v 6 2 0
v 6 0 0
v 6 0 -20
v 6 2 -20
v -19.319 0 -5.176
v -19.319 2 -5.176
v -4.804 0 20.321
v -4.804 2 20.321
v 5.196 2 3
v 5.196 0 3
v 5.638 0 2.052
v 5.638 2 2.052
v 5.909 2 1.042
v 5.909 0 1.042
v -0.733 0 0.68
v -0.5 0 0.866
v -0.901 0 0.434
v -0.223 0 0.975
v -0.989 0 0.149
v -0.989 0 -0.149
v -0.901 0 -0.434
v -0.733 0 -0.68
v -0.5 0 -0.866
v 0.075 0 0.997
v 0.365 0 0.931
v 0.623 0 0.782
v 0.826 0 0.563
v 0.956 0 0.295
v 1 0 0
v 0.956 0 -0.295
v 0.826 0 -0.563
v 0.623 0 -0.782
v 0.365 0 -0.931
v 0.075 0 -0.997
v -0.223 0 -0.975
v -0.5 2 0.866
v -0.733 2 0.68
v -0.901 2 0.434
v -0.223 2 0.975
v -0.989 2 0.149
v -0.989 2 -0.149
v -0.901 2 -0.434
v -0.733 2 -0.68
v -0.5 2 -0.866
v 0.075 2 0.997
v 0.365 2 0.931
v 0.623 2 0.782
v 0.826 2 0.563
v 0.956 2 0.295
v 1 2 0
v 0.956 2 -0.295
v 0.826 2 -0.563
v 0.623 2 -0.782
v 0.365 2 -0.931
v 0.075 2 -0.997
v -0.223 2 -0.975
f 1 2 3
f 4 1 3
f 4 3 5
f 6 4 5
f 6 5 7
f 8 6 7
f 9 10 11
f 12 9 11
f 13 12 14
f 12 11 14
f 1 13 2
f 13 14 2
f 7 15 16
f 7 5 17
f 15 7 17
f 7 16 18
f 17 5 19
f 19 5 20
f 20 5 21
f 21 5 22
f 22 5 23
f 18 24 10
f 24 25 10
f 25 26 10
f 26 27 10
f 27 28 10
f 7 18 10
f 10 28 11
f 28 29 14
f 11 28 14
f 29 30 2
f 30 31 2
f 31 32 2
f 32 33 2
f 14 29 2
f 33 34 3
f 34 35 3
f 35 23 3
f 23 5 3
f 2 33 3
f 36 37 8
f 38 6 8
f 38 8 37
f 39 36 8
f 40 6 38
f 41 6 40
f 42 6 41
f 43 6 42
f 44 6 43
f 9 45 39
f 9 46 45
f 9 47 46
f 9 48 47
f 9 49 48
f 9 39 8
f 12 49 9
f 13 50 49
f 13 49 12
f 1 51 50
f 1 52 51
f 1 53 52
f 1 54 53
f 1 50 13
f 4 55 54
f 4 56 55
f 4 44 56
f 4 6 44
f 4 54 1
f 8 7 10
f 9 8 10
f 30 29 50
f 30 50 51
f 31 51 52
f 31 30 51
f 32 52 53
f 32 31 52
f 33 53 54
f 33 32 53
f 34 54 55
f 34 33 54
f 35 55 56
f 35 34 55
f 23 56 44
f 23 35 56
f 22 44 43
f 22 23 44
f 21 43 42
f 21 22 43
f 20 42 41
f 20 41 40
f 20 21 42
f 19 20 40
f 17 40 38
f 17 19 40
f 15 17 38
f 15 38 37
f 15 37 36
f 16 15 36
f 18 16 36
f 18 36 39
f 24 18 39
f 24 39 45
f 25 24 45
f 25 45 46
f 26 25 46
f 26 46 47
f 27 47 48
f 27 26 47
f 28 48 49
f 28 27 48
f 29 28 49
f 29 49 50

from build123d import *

# Parameters (mm, degrees)
ESQUISSE1_R        = 1
BOSS_EXTRU_1_DEPTH = 2


with BuildPart() as part:
    # Esquisse1 → Boss.-Extru.1 (new body)
    with BuildSketch(Plane(origin=(0, 0, 0), x_dir=(1, 0, 0), z_dir=(0, 1, 0))):
        with BuildLine():
            Line((6, 0), (6, 20))
            Line((6, 20), (-19.318516526, 5.176380902))
            Line((-19.318516526, 5.176380902), (-4.803847577, -20.320508076))
            Line((-4.803847577, -20.320508076), (5.196152423, -3))
            ThreePointArc((5.196152423, -3), (5.795554958, -1.552914271), (6, 0))
        make_face()
        Circle(ESQUISSE1_R, mode=Mode.SUBTRACT)
    extrude(amount=BOSS_EXTRU_1_DEPTH)


solid = part.part
